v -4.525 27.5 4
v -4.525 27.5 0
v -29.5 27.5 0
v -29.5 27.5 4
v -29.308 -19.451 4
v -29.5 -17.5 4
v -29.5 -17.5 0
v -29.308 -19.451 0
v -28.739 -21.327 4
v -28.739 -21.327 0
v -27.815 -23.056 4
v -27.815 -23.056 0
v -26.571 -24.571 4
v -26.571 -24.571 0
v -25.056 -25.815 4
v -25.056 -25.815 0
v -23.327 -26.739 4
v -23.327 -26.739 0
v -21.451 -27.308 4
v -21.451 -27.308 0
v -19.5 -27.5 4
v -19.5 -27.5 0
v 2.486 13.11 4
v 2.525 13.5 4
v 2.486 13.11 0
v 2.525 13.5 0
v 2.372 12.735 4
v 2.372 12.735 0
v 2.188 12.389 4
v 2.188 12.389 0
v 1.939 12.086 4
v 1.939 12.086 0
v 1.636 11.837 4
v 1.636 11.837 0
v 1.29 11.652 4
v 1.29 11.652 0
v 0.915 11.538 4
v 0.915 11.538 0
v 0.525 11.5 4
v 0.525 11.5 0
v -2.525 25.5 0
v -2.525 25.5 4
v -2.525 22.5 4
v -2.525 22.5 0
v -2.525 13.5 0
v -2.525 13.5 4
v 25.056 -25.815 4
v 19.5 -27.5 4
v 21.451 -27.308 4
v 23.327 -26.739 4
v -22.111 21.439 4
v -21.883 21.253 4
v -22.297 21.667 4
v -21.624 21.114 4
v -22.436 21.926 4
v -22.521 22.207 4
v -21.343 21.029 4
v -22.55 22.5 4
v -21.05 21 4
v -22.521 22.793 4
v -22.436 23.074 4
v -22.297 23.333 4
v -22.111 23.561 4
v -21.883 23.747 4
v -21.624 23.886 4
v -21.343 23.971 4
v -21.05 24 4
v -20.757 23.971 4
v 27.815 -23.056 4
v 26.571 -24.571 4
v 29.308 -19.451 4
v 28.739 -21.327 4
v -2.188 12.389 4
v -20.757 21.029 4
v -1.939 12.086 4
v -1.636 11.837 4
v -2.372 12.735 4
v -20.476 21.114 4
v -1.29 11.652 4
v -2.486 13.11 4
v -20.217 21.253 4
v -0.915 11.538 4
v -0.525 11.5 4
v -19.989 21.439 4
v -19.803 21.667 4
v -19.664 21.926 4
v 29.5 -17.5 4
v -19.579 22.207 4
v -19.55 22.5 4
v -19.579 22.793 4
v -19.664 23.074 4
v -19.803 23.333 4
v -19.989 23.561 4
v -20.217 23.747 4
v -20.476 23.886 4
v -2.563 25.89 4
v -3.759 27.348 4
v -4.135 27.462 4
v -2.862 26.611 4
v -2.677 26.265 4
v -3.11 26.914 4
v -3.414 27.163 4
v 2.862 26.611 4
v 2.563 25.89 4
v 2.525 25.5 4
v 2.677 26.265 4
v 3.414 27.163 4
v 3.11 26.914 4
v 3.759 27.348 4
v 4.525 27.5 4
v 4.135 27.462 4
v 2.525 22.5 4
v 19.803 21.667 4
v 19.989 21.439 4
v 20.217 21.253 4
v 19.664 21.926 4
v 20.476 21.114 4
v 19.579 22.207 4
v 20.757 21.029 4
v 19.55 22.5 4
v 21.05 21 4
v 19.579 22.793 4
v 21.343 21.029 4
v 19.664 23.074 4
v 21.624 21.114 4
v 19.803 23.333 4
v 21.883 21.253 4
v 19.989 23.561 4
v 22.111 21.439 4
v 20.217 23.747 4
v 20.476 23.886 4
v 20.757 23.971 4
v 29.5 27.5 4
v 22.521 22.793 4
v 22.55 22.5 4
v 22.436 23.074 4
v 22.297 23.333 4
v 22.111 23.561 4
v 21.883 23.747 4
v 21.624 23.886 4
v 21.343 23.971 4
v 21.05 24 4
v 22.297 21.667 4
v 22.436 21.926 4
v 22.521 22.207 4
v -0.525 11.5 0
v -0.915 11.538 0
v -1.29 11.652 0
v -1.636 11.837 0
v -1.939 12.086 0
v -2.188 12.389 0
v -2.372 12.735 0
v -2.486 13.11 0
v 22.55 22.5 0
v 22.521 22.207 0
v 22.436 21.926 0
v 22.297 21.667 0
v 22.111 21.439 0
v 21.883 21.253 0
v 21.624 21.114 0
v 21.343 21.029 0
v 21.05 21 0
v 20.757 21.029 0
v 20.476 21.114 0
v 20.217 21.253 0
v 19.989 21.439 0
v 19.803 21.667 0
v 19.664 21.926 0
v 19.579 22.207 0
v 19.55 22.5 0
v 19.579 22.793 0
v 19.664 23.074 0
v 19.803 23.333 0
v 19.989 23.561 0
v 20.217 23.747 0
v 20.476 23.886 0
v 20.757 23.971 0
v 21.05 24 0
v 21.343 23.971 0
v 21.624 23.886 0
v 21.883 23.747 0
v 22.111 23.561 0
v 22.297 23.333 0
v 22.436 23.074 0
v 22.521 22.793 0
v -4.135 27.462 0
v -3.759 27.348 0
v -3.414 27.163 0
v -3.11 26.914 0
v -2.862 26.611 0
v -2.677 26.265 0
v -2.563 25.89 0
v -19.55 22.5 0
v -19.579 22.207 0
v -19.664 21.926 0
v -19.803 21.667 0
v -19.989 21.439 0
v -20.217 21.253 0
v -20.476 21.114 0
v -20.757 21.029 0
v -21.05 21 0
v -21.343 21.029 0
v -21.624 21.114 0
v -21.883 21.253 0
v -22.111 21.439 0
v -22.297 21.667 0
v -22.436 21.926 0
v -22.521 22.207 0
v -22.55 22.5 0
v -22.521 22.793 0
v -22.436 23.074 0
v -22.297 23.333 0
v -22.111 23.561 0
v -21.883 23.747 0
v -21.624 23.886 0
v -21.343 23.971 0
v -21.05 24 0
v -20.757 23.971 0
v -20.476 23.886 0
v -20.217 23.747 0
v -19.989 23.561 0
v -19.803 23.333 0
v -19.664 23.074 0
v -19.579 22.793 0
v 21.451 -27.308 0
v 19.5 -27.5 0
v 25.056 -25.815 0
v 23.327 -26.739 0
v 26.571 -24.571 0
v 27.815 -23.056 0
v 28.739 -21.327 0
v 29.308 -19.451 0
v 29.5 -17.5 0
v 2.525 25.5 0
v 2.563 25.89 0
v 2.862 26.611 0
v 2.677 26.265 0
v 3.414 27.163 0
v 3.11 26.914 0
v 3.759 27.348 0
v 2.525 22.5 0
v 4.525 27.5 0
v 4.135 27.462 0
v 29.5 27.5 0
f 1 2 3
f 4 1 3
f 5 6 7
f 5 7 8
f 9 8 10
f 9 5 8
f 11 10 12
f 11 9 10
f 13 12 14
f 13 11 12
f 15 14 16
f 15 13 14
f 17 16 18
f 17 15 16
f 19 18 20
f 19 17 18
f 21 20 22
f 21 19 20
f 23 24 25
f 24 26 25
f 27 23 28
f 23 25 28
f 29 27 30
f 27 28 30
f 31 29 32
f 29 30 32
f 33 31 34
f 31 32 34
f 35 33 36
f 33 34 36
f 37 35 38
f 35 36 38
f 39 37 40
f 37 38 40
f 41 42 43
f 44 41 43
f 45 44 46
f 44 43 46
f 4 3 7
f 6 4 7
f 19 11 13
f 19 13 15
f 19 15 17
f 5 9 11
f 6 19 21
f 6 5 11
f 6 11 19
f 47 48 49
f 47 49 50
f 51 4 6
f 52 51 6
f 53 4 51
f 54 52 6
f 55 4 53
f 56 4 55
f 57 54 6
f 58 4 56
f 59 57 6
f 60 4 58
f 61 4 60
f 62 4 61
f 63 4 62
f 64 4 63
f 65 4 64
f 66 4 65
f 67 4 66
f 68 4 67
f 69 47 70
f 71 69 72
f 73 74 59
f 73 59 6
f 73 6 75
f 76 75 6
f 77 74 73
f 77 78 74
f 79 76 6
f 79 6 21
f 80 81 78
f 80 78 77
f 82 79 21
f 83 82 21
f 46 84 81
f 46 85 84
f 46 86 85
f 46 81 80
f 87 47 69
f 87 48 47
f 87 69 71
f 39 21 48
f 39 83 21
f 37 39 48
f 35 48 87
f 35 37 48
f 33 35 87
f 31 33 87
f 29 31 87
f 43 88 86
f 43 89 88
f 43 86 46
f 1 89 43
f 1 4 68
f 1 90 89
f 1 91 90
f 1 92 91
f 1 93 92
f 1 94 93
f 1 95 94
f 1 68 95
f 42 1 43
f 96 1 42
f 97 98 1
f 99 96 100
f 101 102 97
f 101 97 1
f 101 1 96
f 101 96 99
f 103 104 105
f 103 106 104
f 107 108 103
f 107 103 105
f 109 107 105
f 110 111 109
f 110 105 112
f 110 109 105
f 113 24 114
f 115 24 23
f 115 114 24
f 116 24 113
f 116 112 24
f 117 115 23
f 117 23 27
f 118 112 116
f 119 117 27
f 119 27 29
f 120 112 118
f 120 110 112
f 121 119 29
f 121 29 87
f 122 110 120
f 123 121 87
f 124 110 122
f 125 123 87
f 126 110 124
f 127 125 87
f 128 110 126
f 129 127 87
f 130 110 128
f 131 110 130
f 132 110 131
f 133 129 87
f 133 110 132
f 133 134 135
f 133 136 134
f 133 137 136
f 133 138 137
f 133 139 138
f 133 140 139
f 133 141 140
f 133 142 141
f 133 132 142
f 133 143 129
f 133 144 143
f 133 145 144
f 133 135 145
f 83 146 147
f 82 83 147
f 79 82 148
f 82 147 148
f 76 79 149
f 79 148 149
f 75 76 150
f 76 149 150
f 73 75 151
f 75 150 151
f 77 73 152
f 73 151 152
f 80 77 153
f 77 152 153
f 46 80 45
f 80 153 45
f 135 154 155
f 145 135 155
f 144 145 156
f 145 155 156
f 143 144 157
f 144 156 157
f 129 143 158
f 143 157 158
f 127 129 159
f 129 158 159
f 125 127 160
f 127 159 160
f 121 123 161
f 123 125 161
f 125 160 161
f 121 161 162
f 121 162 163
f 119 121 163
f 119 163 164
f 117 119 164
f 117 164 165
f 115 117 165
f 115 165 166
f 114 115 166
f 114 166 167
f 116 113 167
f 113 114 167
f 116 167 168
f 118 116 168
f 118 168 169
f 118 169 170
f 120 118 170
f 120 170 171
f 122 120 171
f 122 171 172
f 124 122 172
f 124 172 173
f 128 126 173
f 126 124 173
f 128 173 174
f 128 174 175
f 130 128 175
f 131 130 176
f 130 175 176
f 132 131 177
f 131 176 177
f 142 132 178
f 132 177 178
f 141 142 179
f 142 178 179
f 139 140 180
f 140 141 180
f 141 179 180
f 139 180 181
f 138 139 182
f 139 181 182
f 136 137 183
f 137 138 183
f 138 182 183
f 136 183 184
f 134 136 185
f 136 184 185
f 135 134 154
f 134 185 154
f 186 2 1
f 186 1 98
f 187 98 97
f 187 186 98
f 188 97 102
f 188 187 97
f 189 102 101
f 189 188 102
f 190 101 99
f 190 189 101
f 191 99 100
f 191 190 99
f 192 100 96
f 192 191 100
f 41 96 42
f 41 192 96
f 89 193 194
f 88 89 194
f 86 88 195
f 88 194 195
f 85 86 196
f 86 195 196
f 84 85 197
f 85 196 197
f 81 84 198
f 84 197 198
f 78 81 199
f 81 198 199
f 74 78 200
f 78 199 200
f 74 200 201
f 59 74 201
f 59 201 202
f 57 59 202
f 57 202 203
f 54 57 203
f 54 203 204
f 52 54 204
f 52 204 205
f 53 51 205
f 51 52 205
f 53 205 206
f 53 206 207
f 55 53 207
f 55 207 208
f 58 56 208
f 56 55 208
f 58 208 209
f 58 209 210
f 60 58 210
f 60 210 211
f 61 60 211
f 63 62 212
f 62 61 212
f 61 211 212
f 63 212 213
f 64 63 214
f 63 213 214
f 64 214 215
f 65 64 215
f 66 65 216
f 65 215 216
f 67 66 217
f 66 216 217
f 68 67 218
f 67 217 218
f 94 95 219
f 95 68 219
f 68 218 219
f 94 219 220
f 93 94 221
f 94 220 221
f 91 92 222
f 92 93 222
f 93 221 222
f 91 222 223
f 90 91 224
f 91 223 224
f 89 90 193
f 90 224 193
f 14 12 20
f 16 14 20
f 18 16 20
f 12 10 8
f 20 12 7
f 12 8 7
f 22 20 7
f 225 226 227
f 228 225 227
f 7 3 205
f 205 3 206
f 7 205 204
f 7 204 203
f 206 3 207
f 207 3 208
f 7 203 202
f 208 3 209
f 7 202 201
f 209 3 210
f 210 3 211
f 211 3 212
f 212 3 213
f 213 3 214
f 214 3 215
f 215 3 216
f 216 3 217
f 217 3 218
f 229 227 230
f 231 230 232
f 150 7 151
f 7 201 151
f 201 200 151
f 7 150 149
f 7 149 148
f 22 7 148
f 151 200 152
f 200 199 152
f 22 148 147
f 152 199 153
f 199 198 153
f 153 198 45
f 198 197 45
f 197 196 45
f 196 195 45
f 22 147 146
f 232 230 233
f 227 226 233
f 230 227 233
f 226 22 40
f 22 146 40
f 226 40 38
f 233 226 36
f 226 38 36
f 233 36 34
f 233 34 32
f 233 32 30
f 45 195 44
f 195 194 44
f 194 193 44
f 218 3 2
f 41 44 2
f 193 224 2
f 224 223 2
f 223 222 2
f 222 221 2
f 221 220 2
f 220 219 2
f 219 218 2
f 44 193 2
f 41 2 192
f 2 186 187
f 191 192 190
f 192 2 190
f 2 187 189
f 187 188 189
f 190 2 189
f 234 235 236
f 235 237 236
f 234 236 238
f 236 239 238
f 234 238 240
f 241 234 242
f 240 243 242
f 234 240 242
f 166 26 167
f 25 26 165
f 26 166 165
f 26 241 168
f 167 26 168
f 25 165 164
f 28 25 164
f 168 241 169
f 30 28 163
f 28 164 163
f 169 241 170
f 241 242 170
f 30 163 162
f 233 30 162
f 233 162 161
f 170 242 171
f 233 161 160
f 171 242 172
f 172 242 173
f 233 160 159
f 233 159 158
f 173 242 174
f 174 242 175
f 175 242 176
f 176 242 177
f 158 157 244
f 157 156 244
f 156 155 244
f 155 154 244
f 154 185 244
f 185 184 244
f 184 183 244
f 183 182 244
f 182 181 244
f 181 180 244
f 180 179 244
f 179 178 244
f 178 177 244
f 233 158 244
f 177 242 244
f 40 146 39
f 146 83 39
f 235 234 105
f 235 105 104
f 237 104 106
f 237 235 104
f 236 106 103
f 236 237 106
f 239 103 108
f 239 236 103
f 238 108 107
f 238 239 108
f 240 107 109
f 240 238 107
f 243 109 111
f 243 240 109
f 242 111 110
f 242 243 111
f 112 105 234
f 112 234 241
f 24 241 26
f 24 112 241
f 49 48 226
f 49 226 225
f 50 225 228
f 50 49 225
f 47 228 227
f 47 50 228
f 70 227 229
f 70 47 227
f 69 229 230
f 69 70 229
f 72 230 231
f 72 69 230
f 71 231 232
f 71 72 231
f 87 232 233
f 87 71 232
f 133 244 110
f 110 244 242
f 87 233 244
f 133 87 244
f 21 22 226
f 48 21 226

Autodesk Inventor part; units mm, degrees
sketch "Эскиз1" plane through (0, 0, 0) normal (0, 0, 1) x (1, 0, 0)
  line L0 (-29.5, -27.5) -> (29.5, -27.5)
  line L1 (29.5, -27.5) -> (29.5, 27.5)
  line L2 (29.5, 27.5) -> (-29.5, 27.5)
  line L3 (-29.5, 27.5) -> (-29.5, -27.5)
  line L4 (-29.5, -27.5) -> (29.5, 27.5) construction
  line L5 (29.5, -27.5) -> (-29.5, 27.5) construction
  line L6 (0, -7.5) -> (0, -27.5) construction
  circle A0 centre (-21.05, 22.5) radius 1.5
  circle A1 centre (21.05, 22.5) radius 1.5
  line L7 (-21.05, 22.5) -> (21.05, 22.5)
  point P0 (0, 0)
  dimension "d0" = 59
  dimension "d1" = 55
  dimension "d3" = 20
  dimension "d4" = 3
  dimension "d7" = 42.1
  dimension "d8" = 8.45
  dimension "d13" = 5
extrude "Выдавливание1" add sketch "Эскиз1" along normal blind 4
sketch "Эскиз2" plane through (0, 0, 4) normal (0, 0, 1) x (1, 0, 0)
  line L0 (29.5, 27.5) -> (-29.5, 27.5) projected
  line L1 (-2.5247, 27.5) -> (-2.5247, 11.5)
  line L2 (2.5247, 27.5) -> (2.5247, 11.5)
  line L3 (-2.5247, 11.5) -> (2.5247, 11.5)
  point P0 (0, 0)
  dimension "d9" = 16
extrude "Выдавливание2" cut sketch "Эскиз2" against normal up to surface (4 mm away)
fillet "Сопряжение1" radius 2 4 edges at (2.5247, 11.5, 2) (-2.5247, 11.5, 2) (2.5247, 27.5, 2) (-2.5247, 27.5, 2)
sketch "Эскиз3" plane through (0, 0, 4) normal (0, 0, 1) x (1, 0, 0)
  line L0 (-29.5, 27.5) -> (-29.5, -27.5) projected
  line L1 (-29.5, -17.5) -> (-19.5, -17.5) construction
  line L2 (-19.5, -17.5) -> (-19.5, -27.5) construction
  line L3 (-29.5, -27.5) -> (29.5, -27.5) projected
  line L4 (-29.5, 27.5) -> (-29.5, -27.5) projected
  line L5 (-29.5, -27.5) -> (29.5, -27.5) projected
  line L6 (19.5, -27.5) -> (19.5, -17.5) construction
  line L7 (19.5, -17.5) -> (29.5, -17.5) construction
  line L8 (29.5, -27.5) -> (29.5, 27.5) projected
  arc A0 (-29.5, -17.5) -> (-19.5, -27.5) centre (-19.5, -17.5) ccw
  arc A1 (19.5, -27.5) -> (29.5, -17.5) centre (19.5, -17.5) ccw
  point P0 (0, 0)
extrude "Выдавливание3" cut sketch "Эскиз3" against normal up to surface (4 mm away)
properties part number "Скоба трубы"
